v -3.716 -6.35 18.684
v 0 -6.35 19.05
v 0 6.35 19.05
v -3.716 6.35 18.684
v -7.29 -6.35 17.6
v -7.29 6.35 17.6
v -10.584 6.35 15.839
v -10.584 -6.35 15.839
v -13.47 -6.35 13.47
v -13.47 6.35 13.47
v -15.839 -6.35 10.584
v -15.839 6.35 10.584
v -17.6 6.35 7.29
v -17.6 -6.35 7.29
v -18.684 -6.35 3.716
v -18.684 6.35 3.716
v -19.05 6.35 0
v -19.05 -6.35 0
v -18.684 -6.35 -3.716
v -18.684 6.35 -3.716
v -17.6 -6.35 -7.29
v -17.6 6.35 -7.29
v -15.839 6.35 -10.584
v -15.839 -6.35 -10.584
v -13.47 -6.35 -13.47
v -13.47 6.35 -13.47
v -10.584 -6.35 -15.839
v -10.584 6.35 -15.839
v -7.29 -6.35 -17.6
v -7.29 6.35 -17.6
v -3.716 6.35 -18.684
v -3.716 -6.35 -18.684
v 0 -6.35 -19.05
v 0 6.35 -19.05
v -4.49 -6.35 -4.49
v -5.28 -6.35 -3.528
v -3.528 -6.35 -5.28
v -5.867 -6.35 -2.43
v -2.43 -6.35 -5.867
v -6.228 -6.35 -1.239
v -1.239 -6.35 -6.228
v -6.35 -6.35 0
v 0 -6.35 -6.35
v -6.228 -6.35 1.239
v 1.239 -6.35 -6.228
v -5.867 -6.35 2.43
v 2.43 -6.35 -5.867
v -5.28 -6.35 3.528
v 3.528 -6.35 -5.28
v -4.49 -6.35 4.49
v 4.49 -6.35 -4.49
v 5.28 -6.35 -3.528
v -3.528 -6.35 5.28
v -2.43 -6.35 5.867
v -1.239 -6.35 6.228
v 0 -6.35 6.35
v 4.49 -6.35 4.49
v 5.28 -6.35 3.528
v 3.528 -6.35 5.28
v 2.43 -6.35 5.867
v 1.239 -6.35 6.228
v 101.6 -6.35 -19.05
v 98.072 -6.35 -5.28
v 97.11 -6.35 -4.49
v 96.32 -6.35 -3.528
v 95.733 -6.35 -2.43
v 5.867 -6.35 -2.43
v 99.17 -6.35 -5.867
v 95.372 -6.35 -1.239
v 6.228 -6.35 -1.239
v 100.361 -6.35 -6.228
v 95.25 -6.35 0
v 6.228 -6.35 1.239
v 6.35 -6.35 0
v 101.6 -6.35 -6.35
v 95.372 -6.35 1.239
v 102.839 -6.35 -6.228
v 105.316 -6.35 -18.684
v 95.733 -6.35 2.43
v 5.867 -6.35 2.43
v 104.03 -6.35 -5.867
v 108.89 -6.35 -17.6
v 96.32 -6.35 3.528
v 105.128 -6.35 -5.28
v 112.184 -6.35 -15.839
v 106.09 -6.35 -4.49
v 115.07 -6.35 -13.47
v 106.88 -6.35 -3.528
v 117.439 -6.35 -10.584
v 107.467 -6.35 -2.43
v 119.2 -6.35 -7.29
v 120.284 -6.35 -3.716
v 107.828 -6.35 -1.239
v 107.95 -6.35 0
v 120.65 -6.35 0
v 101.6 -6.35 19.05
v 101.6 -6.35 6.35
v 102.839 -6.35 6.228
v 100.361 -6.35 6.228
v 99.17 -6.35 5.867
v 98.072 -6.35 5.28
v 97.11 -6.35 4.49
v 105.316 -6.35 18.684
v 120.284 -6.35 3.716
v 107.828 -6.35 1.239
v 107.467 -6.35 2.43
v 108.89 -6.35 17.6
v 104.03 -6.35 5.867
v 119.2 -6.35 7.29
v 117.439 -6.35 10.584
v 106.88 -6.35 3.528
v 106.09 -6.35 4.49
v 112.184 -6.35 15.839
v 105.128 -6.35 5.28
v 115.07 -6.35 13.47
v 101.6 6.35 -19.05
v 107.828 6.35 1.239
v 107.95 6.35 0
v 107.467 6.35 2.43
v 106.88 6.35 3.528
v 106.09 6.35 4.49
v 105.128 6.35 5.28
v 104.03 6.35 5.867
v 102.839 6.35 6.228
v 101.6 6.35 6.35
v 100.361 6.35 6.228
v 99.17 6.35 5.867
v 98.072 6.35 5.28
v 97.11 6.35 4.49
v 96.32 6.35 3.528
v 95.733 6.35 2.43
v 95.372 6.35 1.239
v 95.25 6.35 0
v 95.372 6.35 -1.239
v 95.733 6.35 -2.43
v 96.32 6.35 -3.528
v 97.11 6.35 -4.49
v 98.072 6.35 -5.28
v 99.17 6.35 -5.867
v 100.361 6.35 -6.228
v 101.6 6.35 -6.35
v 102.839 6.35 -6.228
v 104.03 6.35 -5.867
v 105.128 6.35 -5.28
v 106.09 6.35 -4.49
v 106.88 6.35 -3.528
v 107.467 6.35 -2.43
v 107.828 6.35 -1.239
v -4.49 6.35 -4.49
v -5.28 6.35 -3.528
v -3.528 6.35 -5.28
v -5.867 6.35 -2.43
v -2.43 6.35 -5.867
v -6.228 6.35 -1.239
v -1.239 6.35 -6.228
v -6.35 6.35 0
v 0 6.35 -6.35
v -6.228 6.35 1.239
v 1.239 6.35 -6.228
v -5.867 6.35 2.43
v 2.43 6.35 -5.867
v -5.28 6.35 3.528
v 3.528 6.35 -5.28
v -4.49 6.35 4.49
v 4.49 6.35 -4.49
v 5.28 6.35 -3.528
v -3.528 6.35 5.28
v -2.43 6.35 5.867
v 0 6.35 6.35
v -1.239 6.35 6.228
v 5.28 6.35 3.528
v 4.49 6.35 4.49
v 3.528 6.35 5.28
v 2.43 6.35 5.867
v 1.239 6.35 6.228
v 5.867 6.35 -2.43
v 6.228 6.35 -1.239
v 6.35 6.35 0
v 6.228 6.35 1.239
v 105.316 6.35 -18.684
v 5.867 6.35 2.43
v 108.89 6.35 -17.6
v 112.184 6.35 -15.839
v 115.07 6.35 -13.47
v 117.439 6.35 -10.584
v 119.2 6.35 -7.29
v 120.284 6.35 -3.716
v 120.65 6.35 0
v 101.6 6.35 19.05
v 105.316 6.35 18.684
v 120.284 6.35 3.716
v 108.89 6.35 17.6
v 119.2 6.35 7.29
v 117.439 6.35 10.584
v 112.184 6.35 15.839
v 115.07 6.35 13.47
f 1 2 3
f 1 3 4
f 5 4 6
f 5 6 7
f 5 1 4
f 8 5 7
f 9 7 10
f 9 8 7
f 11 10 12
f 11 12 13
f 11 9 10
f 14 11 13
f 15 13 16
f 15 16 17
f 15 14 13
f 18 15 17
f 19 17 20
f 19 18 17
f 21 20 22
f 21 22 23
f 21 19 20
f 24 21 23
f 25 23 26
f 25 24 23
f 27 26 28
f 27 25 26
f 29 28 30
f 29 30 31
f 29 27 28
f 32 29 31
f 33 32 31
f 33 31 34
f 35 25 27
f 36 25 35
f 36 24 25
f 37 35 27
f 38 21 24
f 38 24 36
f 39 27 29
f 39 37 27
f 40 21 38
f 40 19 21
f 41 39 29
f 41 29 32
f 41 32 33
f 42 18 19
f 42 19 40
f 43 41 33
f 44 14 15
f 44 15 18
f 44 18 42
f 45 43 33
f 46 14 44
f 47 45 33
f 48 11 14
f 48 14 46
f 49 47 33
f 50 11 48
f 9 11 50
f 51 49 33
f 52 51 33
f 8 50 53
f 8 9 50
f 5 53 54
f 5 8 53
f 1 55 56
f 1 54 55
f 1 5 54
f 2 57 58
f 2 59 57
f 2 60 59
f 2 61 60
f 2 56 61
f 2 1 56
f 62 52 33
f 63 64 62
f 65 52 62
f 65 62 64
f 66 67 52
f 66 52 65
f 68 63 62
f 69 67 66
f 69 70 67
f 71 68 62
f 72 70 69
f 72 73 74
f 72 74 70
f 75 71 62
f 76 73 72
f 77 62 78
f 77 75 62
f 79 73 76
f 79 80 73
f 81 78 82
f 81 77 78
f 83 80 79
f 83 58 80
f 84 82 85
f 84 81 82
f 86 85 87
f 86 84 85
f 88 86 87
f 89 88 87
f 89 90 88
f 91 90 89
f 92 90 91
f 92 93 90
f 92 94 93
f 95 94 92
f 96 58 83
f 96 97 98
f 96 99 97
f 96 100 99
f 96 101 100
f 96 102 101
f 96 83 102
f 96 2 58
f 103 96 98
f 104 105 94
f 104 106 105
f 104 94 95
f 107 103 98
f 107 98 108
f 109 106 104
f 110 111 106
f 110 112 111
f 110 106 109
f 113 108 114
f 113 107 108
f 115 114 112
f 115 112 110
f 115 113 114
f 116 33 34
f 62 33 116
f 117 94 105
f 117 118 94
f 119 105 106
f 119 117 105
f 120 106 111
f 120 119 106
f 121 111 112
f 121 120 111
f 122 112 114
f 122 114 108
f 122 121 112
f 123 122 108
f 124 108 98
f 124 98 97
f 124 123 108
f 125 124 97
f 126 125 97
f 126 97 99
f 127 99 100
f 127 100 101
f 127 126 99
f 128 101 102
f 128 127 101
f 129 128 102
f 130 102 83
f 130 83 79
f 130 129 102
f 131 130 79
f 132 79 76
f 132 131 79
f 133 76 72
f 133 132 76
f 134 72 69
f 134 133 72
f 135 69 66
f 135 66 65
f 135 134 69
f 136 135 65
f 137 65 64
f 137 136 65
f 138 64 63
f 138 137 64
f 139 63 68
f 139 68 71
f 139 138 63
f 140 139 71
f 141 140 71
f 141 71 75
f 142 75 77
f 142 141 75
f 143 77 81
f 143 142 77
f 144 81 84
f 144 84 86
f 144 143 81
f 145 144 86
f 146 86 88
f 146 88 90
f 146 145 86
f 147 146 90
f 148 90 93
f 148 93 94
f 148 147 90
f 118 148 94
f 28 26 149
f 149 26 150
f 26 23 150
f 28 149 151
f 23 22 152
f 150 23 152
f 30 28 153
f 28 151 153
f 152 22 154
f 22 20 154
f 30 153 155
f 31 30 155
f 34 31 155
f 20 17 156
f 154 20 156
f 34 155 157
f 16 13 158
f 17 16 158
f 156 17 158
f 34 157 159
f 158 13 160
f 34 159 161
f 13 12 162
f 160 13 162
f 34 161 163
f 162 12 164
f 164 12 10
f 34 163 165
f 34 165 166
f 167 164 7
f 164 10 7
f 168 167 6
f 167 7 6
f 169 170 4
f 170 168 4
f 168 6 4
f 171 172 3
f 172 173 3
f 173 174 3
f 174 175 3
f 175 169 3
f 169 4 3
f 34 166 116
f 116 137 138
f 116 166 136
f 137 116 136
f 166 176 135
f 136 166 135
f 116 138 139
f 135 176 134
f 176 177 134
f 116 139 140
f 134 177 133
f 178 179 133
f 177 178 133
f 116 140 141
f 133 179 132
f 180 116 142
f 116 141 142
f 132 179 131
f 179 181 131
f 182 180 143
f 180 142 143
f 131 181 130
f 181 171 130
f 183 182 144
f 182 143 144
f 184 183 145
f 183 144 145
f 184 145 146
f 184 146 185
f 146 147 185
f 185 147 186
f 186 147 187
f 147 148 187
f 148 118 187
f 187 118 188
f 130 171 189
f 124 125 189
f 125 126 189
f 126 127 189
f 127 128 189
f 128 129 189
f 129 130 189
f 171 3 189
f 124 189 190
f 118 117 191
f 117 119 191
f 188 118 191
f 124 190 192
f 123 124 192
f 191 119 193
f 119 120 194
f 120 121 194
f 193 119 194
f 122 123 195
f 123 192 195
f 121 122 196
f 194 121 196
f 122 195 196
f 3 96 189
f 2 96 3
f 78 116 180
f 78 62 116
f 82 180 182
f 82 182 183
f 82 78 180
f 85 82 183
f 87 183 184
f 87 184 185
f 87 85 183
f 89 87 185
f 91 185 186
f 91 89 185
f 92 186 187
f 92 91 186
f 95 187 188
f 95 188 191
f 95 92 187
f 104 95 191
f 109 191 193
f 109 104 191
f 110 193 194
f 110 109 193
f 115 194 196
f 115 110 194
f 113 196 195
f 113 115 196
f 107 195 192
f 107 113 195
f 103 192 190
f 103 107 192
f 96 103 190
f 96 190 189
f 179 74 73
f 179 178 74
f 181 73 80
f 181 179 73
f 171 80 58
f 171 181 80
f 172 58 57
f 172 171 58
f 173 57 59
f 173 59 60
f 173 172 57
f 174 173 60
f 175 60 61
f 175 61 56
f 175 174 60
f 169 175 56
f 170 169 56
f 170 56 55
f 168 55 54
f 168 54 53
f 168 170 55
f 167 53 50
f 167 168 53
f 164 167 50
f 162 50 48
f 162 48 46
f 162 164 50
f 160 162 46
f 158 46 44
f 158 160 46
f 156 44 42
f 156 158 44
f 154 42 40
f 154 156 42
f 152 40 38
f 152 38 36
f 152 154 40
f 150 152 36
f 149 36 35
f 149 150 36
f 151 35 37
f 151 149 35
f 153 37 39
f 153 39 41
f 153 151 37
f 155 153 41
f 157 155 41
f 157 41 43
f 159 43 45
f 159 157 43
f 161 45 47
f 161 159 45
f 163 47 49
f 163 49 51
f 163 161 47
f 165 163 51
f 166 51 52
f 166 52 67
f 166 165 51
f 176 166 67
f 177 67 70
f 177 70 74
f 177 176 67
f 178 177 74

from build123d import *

# Parameters (mm, degrees)
F0_R     = 6.35
F1_DEPTH = 6.35


with BuildPart() as f1:
    # F0 (on Front) → F1 (new body, symmetric)
    with BuildSketch(Plane.XZ):
        with BuildLine():
            Line((101.6, 19.05), (0, 19.05))
            ThreePointArc((0, 19.05), (-19.05, 0), (0, -19.05))
            Line((0, -19.05), (101.6, -19.05))
            ThreePointArc((101.6, -19.05), (120.65, 0), (101.6, 19.05))
        make_face()
        Circle(F0_R, mode=Mode.SUBTRACT)
        with Locations((101.6, 0)):
            Circle(F0_R, mode=Mode.SUBTRACT)
    extrude(amount=F1_DEPTH, both=True)


solid = f1.part
